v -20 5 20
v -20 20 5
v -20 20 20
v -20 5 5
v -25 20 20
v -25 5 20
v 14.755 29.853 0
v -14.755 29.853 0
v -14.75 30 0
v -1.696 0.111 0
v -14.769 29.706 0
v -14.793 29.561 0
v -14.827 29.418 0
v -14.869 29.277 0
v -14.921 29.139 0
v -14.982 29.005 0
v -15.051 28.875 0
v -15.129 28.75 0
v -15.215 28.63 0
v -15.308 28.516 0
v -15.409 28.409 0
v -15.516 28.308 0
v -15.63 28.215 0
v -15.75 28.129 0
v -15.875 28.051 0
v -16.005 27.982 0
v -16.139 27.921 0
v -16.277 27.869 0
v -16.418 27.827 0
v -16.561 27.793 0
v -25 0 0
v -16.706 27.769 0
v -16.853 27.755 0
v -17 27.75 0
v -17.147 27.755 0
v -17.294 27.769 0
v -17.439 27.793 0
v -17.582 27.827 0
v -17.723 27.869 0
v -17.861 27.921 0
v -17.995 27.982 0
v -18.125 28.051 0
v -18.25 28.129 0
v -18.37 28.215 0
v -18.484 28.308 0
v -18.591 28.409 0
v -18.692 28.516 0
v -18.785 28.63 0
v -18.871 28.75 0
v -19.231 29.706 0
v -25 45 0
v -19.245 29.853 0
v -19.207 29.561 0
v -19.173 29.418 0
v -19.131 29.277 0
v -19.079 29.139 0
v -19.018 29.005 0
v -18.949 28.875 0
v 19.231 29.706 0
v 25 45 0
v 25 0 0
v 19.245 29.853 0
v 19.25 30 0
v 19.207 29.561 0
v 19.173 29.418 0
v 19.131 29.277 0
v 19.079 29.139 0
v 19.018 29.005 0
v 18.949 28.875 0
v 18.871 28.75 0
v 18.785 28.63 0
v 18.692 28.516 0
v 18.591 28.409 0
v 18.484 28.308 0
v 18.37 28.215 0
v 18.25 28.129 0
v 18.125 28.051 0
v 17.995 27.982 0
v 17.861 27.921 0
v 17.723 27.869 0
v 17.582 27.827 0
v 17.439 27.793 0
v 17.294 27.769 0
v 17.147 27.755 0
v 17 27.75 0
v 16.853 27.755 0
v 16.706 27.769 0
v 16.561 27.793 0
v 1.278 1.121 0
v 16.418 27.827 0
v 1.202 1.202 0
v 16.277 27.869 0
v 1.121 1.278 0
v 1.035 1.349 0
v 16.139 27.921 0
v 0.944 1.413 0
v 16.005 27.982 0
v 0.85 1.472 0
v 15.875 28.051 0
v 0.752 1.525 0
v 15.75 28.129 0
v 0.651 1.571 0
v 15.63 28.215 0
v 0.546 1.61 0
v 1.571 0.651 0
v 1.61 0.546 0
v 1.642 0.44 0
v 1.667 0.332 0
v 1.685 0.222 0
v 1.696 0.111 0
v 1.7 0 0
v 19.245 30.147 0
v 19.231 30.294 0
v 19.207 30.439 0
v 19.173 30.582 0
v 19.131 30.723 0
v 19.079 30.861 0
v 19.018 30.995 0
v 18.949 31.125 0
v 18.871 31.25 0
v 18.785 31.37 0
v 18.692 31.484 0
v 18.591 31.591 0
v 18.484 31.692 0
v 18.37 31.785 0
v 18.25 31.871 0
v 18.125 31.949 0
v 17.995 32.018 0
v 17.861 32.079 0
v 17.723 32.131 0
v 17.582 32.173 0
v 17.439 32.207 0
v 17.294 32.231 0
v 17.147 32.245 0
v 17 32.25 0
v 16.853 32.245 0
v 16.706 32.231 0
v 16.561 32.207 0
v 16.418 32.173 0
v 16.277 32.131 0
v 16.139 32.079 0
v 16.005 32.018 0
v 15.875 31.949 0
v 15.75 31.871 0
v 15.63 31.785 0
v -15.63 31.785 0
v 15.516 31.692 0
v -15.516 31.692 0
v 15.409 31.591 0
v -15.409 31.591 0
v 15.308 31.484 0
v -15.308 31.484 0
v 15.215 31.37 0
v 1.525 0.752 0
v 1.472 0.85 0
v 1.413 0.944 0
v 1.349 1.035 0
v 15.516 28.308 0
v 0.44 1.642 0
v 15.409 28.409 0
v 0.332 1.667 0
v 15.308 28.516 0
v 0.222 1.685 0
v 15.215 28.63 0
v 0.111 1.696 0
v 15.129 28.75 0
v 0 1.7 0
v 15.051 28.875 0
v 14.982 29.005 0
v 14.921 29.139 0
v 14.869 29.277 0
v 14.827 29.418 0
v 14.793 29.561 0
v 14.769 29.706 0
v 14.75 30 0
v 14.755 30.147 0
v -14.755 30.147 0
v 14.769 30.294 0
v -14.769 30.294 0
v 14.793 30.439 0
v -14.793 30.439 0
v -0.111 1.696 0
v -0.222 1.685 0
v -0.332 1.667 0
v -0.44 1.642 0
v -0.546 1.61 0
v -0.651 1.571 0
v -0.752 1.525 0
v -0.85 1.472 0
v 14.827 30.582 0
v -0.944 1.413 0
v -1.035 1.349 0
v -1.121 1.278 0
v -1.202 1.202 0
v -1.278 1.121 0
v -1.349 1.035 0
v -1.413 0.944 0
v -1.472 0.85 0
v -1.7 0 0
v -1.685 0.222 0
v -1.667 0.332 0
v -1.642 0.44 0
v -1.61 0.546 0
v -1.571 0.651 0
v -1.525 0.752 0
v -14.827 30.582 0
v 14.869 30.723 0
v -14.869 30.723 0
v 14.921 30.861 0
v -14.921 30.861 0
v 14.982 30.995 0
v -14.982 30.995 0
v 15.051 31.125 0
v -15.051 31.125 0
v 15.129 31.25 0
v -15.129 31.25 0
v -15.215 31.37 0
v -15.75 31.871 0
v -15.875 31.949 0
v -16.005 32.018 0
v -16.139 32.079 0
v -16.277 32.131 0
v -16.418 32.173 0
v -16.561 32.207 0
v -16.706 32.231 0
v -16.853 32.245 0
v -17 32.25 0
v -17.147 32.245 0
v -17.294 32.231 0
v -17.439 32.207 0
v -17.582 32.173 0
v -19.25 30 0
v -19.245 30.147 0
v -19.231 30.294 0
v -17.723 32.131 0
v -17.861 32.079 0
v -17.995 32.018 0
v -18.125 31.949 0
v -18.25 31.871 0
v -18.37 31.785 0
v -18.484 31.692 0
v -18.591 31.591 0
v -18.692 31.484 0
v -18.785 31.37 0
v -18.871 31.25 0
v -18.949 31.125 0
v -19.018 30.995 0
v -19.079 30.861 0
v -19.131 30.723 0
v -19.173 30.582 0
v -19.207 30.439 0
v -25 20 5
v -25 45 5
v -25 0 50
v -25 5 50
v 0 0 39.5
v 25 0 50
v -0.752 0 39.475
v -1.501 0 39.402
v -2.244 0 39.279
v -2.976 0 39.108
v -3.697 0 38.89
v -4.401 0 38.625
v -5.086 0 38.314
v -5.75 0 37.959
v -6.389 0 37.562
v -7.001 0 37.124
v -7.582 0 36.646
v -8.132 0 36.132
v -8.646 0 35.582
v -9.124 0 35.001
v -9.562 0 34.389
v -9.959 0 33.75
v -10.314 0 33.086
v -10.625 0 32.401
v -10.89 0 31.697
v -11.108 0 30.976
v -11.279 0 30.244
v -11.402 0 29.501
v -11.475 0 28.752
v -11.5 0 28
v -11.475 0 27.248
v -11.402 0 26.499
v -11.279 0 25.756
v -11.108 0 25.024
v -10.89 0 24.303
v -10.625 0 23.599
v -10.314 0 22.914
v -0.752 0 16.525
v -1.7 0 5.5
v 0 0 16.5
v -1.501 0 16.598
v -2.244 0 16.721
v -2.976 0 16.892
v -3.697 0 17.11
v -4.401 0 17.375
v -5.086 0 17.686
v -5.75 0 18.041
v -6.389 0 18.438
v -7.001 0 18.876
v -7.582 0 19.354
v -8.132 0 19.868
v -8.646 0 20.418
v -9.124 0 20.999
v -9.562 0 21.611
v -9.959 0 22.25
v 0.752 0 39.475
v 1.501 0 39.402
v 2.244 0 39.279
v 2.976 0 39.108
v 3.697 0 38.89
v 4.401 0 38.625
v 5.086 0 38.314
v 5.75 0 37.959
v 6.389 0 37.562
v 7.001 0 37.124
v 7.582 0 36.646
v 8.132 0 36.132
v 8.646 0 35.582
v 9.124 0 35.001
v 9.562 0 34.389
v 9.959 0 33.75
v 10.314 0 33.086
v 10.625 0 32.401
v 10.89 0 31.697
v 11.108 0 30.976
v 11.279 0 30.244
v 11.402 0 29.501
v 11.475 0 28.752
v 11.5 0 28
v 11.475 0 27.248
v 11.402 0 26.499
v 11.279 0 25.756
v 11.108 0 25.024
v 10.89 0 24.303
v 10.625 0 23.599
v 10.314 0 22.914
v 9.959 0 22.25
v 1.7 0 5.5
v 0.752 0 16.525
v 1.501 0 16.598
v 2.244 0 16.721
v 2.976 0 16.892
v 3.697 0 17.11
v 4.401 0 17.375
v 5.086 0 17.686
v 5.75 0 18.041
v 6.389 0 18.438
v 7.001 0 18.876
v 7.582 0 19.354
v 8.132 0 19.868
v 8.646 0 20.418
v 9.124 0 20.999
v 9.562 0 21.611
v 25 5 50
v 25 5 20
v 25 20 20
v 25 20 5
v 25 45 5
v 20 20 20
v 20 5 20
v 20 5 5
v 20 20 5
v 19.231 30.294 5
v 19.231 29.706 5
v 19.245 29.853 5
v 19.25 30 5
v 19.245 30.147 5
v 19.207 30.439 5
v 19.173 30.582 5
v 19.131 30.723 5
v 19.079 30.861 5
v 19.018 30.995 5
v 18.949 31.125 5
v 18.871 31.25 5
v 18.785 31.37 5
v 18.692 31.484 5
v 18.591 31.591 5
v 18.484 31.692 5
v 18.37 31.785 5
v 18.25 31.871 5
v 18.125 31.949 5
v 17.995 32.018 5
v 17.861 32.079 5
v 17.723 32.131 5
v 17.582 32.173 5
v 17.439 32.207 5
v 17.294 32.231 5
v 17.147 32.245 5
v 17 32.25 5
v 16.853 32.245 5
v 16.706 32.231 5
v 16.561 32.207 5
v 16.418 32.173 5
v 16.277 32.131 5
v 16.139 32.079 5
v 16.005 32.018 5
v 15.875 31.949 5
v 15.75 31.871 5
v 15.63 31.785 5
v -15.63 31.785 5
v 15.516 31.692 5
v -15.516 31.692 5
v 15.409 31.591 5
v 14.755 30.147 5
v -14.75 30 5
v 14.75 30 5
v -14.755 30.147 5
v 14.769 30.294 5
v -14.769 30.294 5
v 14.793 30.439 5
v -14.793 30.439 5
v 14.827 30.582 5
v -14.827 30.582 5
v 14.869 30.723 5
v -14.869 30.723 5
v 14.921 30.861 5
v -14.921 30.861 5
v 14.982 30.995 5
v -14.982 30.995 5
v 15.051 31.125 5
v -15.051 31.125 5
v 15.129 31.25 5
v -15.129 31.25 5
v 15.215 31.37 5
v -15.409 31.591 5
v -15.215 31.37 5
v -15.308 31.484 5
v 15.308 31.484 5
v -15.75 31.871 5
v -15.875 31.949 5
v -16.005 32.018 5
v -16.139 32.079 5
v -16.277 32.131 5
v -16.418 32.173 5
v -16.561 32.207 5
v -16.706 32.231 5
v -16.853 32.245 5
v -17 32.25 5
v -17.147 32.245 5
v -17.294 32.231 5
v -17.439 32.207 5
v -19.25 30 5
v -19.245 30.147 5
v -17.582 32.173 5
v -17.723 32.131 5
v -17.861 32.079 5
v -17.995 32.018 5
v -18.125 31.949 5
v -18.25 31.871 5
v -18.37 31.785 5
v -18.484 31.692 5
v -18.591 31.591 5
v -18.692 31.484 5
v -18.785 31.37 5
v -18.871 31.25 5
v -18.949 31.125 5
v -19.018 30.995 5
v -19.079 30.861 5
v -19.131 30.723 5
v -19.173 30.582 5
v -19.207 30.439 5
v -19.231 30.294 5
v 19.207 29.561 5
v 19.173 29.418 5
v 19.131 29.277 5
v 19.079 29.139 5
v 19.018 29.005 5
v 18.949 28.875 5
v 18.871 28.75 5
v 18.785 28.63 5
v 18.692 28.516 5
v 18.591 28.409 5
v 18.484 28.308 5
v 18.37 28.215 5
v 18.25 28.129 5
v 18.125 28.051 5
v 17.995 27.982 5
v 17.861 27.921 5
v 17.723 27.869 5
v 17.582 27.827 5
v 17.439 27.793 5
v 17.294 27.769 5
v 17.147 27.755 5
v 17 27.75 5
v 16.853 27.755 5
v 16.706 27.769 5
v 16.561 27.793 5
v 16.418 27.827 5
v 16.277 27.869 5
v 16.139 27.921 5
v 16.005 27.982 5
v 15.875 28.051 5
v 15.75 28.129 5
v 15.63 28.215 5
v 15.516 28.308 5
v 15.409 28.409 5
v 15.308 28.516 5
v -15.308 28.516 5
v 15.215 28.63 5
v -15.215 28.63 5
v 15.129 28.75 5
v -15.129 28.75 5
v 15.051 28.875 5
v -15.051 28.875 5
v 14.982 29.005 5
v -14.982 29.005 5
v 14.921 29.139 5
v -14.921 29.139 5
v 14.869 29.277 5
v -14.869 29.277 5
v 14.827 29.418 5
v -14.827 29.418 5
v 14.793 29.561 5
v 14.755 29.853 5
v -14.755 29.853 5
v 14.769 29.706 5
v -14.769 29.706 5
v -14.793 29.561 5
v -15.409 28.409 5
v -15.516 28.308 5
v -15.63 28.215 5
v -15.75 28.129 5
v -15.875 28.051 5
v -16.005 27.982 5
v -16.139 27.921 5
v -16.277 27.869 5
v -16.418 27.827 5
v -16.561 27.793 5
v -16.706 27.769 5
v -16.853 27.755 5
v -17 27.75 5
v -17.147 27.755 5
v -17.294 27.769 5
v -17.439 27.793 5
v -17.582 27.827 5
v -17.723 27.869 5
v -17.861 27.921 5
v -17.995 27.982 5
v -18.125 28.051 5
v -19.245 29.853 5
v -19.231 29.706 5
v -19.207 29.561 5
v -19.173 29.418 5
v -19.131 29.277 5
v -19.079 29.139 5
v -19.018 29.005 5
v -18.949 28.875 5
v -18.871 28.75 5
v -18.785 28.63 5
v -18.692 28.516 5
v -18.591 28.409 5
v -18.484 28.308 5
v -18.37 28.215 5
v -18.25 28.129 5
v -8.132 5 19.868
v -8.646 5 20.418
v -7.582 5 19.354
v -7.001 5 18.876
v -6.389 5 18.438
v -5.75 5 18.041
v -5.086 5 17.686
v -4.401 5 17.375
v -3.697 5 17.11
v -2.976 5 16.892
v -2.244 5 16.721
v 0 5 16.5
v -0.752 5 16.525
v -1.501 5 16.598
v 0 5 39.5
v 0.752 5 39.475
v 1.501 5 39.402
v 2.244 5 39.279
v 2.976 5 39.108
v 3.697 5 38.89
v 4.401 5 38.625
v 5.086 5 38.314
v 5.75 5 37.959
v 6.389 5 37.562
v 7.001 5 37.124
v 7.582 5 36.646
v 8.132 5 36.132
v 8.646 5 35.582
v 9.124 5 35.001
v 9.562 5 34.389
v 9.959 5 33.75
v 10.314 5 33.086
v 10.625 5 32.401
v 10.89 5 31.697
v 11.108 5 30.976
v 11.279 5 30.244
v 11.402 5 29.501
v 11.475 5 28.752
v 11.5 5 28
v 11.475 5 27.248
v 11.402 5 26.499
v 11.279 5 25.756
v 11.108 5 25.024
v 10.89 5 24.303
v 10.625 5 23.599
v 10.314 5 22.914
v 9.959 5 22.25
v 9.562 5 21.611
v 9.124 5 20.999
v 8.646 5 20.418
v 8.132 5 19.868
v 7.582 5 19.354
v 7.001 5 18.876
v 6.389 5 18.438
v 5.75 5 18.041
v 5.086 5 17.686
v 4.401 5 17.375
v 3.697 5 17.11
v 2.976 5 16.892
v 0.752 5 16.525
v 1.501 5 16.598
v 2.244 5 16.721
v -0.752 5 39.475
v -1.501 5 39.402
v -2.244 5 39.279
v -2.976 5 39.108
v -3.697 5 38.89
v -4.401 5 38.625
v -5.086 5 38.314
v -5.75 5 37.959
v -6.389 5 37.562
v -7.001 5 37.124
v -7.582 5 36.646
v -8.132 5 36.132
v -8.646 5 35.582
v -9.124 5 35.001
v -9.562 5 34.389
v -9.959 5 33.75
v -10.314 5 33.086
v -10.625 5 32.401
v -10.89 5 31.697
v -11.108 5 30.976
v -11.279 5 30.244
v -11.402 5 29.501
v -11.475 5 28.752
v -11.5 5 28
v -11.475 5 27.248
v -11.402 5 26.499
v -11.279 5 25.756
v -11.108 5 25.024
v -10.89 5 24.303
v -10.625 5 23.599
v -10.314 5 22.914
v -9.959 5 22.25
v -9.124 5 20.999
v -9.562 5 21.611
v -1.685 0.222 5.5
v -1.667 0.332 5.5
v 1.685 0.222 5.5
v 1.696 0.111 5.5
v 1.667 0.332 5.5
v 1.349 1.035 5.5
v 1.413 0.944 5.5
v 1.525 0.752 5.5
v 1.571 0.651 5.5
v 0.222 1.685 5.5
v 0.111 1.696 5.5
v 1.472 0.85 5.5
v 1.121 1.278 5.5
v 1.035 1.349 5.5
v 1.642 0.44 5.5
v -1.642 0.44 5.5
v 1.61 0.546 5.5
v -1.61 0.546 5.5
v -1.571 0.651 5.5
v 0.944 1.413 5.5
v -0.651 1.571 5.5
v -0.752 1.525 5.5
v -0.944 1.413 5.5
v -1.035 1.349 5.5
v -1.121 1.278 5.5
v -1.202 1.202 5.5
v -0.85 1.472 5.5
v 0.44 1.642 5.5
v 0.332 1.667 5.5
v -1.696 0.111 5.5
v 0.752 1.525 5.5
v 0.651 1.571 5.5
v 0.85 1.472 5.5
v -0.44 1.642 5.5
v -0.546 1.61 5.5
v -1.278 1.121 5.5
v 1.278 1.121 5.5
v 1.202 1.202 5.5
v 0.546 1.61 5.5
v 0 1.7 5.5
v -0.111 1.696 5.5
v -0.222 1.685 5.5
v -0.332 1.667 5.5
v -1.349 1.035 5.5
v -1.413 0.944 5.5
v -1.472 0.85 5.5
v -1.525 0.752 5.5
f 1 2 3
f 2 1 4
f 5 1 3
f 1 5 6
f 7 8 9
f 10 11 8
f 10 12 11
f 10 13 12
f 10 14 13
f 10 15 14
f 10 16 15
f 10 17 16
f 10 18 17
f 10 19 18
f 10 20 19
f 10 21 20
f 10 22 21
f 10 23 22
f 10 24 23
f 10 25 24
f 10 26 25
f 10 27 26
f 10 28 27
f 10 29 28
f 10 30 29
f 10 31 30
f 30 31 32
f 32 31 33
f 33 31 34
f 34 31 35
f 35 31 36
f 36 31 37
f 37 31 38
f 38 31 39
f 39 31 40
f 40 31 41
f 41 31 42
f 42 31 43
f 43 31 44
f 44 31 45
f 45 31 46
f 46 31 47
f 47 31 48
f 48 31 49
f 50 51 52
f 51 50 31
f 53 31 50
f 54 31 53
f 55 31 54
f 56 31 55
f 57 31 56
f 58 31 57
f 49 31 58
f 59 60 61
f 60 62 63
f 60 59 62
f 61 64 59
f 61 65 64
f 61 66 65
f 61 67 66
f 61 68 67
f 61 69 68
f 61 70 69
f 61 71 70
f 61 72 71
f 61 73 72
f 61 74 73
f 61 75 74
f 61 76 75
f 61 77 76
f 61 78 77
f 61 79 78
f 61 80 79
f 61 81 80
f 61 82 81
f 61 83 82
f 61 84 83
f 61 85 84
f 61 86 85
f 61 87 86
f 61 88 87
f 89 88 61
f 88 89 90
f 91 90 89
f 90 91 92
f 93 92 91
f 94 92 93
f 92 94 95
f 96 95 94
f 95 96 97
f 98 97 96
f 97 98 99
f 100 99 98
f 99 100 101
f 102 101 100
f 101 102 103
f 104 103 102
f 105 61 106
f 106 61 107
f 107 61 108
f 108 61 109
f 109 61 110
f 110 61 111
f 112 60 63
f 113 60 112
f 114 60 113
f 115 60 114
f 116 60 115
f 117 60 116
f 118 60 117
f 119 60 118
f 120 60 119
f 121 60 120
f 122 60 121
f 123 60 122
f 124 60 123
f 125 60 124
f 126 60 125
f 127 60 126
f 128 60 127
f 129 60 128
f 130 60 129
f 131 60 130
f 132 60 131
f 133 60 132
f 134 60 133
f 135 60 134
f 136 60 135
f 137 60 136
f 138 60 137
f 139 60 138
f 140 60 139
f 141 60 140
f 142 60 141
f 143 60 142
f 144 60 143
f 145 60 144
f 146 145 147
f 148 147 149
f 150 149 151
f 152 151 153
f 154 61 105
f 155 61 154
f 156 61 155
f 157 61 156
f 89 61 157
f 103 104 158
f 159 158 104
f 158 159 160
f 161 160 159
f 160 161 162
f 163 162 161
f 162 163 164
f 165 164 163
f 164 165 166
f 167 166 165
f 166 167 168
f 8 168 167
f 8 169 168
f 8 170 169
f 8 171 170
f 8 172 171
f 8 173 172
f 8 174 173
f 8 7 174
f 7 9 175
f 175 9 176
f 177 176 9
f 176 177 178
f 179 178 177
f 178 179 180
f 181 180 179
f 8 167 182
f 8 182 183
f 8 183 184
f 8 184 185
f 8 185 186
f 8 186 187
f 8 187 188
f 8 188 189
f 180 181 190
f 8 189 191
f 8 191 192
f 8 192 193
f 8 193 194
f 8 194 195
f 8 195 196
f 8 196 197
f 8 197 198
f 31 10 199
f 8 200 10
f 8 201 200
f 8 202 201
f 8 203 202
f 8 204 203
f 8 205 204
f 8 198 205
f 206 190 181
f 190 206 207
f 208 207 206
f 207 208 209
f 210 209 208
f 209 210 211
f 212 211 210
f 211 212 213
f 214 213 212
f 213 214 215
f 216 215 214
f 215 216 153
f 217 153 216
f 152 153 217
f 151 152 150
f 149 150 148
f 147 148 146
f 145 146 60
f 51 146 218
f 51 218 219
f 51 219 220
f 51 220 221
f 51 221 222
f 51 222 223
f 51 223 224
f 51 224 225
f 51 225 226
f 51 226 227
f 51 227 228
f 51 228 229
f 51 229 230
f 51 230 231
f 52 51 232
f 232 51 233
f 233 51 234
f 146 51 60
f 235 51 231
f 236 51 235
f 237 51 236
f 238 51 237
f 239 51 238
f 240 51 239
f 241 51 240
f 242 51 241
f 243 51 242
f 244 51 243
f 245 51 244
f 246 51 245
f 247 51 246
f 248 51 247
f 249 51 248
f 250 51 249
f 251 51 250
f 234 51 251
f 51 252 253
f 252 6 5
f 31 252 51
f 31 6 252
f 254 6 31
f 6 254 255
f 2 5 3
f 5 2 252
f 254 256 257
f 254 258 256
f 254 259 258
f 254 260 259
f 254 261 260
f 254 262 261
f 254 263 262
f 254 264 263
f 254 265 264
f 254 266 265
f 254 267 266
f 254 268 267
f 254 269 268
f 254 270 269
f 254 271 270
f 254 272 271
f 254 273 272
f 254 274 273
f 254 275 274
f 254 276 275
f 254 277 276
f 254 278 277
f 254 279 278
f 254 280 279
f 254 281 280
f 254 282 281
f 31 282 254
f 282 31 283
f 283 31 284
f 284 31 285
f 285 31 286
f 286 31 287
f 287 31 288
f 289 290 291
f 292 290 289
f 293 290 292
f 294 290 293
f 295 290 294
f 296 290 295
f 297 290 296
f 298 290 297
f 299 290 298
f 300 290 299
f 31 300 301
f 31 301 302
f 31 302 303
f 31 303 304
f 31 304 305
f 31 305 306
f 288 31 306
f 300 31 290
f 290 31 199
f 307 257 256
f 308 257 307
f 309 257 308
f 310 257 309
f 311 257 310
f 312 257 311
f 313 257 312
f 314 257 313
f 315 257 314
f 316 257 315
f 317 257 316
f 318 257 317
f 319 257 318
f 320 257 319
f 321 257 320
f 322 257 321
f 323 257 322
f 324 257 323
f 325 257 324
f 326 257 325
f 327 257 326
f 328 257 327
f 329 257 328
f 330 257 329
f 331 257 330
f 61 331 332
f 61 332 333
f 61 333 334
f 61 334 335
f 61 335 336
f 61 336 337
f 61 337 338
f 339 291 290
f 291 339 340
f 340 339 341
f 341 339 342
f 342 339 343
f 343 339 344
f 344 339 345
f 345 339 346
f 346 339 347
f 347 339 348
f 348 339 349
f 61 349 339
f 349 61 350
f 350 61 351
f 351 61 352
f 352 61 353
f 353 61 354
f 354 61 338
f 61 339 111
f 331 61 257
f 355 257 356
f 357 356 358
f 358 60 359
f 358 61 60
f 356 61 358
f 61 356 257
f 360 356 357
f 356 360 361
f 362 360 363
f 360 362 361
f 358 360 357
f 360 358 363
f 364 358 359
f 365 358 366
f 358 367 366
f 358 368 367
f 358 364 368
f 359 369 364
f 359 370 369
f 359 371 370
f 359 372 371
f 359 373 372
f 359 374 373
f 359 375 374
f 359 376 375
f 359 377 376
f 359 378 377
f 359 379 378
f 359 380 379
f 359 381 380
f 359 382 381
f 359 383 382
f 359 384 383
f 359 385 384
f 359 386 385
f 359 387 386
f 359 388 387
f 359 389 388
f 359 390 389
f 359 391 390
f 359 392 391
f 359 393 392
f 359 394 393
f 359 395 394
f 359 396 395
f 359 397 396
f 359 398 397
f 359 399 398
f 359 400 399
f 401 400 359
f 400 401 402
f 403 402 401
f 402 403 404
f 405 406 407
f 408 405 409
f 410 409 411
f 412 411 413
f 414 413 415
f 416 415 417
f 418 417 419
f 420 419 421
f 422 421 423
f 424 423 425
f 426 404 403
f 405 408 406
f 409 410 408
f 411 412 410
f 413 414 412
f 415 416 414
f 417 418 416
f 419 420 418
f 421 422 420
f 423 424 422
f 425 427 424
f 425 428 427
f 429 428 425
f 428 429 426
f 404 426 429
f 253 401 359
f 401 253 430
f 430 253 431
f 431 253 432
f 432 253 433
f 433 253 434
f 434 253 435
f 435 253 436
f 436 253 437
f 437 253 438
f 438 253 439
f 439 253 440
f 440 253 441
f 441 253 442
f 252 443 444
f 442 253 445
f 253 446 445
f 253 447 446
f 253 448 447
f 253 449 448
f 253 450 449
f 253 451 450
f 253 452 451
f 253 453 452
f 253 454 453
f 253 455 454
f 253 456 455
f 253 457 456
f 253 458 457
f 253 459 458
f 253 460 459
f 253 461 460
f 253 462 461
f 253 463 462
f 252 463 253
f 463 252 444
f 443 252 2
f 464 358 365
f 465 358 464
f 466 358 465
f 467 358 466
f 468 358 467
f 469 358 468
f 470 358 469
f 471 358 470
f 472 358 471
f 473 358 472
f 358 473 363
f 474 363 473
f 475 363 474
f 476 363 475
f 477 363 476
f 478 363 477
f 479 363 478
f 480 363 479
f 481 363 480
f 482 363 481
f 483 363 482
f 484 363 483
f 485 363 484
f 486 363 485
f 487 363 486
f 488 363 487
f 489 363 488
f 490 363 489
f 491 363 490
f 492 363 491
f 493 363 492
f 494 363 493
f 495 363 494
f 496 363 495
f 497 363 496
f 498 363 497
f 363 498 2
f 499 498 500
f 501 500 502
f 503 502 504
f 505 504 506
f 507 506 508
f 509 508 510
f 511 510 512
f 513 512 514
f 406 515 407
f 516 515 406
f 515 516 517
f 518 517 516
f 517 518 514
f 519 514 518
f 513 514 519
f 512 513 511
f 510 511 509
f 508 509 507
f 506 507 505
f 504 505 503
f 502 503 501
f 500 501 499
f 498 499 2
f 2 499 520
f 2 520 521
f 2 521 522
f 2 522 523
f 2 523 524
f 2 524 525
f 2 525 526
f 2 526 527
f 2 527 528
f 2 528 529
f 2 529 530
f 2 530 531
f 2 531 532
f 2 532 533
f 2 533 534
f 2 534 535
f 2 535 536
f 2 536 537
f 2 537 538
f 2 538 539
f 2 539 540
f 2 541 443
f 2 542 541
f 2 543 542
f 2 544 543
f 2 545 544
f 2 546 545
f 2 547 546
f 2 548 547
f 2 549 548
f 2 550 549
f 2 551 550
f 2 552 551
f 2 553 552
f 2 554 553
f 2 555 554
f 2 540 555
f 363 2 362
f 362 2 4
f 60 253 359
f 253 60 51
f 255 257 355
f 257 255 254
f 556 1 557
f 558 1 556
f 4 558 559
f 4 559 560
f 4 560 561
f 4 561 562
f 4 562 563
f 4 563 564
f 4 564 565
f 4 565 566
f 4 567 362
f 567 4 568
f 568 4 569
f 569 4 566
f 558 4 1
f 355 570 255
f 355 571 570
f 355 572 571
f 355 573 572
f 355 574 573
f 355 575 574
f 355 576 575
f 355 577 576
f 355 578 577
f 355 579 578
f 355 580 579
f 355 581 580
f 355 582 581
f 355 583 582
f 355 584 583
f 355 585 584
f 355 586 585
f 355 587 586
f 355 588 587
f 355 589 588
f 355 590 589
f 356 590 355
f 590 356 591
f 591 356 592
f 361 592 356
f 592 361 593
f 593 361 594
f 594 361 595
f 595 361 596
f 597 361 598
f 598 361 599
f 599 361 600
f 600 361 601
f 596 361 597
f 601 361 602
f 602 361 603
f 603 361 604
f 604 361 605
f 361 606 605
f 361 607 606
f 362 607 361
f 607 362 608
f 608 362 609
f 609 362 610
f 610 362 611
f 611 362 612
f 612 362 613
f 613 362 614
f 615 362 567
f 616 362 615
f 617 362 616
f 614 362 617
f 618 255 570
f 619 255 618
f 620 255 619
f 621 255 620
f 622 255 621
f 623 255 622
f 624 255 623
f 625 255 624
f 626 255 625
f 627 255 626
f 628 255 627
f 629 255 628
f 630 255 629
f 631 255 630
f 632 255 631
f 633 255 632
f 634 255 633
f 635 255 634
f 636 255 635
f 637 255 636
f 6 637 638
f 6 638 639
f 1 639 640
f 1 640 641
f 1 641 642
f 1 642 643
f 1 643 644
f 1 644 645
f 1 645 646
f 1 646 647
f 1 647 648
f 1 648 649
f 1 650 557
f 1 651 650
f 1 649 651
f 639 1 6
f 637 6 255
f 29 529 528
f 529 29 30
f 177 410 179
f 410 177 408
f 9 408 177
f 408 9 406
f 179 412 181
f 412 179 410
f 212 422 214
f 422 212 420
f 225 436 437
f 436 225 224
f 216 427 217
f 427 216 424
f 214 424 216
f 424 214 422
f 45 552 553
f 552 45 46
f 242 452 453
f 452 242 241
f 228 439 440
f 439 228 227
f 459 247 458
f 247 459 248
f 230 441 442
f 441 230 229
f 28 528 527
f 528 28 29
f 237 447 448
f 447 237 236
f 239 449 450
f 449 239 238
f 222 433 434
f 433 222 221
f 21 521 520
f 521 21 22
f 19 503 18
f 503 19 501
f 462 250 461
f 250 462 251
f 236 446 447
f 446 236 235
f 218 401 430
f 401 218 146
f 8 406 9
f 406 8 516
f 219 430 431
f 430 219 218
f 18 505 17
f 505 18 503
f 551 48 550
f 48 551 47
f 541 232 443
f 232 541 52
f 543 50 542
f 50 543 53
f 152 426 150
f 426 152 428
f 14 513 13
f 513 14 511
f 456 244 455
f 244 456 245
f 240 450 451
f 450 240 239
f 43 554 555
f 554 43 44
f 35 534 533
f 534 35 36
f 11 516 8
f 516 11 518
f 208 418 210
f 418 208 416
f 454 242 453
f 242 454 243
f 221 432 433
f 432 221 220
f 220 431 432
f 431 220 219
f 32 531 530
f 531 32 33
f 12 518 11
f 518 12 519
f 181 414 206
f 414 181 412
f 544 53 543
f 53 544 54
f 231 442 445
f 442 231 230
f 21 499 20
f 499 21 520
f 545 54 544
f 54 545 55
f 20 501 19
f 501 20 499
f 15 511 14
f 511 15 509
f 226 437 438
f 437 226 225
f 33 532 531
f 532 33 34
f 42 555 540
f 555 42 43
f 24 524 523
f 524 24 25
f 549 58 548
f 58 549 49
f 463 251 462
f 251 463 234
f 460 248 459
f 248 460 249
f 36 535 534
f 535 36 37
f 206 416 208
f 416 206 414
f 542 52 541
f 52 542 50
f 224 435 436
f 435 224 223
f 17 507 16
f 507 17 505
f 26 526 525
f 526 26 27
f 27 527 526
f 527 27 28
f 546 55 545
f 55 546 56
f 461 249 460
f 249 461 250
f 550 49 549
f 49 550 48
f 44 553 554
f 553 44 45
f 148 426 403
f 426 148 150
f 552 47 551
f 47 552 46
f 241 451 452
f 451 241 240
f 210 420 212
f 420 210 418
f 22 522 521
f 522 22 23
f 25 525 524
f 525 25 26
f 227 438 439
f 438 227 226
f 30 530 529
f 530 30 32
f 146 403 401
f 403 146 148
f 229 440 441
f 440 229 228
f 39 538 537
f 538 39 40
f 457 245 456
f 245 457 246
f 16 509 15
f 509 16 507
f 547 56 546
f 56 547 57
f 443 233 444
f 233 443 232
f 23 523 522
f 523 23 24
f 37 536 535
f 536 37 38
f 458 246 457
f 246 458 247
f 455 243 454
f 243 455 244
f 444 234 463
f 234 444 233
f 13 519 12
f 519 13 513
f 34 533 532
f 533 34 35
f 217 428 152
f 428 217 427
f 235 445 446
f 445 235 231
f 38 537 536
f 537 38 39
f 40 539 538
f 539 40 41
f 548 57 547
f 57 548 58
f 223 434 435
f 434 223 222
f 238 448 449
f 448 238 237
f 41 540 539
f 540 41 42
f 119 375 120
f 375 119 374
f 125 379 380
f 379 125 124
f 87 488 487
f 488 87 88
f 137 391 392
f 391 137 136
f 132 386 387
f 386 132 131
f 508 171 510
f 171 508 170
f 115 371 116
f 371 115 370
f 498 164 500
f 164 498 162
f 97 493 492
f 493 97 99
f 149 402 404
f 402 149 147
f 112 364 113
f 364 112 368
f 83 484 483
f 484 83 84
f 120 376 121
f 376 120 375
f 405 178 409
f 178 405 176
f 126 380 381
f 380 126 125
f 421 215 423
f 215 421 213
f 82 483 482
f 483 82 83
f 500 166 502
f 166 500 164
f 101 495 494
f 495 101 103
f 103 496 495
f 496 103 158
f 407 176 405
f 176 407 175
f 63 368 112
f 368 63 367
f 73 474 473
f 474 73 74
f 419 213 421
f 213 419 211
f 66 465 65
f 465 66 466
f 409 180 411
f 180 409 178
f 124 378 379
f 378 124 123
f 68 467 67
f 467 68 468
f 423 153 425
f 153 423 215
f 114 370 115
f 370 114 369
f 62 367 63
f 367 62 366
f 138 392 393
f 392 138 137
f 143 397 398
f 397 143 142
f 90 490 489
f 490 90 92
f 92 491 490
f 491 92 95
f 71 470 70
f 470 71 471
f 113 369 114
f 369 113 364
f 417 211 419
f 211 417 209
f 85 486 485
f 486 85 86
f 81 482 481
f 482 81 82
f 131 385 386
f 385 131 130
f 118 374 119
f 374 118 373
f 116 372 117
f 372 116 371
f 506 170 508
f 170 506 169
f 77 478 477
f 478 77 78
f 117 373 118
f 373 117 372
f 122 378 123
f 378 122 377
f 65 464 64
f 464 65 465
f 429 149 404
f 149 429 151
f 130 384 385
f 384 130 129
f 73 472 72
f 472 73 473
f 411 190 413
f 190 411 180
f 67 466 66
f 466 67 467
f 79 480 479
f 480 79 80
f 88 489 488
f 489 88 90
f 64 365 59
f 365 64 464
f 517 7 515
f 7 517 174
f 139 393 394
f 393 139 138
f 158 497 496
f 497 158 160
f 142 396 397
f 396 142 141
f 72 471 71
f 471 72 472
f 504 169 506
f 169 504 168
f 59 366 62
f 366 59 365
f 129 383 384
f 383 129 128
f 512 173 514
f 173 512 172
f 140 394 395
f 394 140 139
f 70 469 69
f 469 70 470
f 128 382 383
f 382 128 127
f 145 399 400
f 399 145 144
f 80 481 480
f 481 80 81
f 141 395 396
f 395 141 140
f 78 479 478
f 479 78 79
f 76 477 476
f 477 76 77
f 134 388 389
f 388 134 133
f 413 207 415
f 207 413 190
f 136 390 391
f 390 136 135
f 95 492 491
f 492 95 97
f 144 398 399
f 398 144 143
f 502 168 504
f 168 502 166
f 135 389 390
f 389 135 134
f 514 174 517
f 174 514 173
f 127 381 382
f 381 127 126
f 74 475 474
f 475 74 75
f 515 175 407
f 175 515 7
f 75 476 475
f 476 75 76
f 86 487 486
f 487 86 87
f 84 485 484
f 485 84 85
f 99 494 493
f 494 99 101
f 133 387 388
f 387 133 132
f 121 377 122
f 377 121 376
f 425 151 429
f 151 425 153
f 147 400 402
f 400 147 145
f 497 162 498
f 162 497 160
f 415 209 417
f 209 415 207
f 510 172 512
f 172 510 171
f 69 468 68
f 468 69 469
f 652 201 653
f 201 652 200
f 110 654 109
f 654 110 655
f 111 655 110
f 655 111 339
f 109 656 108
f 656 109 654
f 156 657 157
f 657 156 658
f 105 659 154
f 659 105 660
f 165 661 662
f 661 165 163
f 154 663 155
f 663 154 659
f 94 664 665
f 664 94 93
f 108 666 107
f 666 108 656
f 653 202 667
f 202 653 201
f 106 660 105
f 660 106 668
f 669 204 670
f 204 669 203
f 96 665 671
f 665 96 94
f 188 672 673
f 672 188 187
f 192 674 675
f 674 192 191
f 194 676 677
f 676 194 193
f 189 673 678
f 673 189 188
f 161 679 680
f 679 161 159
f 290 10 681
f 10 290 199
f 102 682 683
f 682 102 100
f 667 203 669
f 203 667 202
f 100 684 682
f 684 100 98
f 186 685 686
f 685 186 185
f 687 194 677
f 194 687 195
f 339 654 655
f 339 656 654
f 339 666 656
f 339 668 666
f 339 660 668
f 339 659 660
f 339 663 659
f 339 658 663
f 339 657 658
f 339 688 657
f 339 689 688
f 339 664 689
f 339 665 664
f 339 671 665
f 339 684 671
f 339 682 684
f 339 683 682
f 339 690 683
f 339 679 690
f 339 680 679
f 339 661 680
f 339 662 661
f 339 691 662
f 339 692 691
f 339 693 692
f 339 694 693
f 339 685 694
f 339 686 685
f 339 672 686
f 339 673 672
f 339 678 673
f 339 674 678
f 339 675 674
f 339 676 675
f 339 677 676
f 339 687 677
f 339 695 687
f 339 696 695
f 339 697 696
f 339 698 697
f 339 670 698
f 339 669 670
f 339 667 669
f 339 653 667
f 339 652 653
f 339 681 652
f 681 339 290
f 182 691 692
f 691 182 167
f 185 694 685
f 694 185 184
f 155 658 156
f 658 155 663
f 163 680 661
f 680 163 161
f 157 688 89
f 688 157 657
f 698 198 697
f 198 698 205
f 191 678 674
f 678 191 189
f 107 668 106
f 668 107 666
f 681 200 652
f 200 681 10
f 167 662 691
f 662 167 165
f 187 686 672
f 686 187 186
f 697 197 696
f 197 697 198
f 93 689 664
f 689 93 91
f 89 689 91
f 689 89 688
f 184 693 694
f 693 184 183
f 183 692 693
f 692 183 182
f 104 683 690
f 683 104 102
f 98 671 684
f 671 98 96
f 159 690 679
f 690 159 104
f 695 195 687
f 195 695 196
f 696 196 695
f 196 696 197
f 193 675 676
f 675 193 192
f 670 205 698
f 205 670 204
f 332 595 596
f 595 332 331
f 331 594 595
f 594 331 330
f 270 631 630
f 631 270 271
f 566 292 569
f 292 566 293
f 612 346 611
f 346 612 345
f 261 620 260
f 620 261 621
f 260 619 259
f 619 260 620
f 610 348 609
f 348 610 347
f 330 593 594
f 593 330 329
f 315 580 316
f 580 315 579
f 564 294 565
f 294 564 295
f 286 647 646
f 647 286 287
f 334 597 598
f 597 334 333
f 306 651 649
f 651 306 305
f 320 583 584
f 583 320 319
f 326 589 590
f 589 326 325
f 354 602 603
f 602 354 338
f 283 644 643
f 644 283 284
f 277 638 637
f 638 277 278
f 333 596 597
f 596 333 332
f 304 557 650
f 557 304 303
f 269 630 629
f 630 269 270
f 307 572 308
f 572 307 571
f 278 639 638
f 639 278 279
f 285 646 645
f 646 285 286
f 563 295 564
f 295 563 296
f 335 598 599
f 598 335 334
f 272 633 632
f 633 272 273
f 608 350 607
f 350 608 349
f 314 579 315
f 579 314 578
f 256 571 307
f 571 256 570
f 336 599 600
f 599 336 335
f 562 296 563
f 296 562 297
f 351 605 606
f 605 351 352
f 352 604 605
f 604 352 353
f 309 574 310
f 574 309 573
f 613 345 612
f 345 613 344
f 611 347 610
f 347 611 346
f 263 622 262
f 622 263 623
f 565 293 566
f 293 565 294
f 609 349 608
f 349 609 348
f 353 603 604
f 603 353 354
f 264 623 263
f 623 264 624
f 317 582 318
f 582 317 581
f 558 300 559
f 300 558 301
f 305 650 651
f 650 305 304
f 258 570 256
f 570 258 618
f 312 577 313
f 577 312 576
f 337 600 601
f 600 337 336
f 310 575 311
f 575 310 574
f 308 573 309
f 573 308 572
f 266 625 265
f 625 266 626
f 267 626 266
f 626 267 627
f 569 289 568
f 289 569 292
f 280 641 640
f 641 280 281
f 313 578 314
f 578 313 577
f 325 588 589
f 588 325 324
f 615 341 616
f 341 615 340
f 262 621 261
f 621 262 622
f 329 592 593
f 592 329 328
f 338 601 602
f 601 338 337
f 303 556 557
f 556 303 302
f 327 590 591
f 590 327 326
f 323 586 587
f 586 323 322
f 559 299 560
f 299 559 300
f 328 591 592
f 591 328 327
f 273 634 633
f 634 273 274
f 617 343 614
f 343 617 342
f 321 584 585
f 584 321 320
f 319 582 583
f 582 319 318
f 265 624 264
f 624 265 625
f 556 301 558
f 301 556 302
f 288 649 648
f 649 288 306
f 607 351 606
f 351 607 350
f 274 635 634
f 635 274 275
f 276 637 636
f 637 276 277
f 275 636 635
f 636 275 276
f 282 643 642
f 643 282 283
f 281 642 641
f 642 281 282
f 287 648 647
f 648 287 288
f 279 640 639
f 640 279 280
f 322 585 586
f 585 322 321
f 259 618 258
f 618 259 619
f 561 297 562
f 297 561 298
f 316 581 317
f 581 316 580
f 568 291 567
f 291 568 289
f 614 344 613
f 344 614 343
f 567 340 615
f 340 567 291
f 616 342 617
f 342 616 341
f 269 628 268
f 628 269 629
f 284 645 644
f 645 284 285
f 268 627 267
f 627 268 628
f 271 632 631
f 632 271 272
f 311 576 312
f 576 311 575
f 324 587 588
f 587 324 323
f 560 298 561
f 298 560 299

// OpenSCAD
// L-shaped mounting bracket for NEMA 17 stepper motor (syringe pump)
// Print orientation: base plate on bed, motor plate builds upward (+Z)

// ---------------- Parameters ----------------
plate_w      = 50;    // base plate length (X)
plate_h      = 45;    // base plate width (Y)
plate_t      = 5;     // base plate thickness (Z)

hole_x       = 17;    // M4 through-hole offset from origin (±X)
hole_y       = 30;    // M4 through-hole position (Y)
hole_d       = 4.5;   // M4 through-hole diameter

motor_w      = 50;    // motor plate length (X)
motor_h      = 5;     // motor plate width (Y)
motor_z      = 50;    // motor plate height (Z)

boss_d       = 23;    // motor centring boss hole diameter
boss_x       = 0;     // boss hole centre X
boss_z       = 28;    // boss hole centre Z

screw_d      = 3.4;   // M3 screw hole diameter
screw_pitch  = 31;    // square pattern side length

gusset_t     = 5;     // gusset thickness (X)
gusset_leg   = 20;    // right-triangle leg length (Y and Z)

eps          = 0.5;   // cutter overshoot past faces
$fn          = 96;    // curve resolution

// ---------------- Model ----------------
difference() {
    union() {
        // Base plate
        translate([-plate_w/2, 0, 0])
            cube([plate_w, plate_h, plate_t]);

        // Motor plate (overlaps base plate for a solid union)
        translate([-motor_w/2, 0, 0])
            cube([motor_w, motor_h, motor_z]);

        // Gussets: right-triangle in YZ, flush with outer X edges
        for (sx = [-1, 1])
            translate([sx > 0 ? motor_w/2 - gusset_t : -motor_w/2, 0, 0])
                cube([gusset_t, gusset_leg, gusset_leg]);
    }

    // M4 through-holes in base plate
    for (x = [-hole_x, hole_x])
        translate([x, hole_y, -eps])
            cylinder(d = hole_d, h = plate_t + 2*eps);

    // Motor boss hole through motor plate (along Y)
    translate([boss_x, -eps, boss_z])
        rotate([-90, 0, 0])
            cylinder(d = boss_d, h = motor_h + 2*eps);

    // M3 screw holes on square pattern, centred on boss hole
    for (a = [0, 90, 180, 270])
        rotate([0, 0, a])
            translate([0, 0, -eps])
                cylinder(d = screw_d, h = motor_h + 2*eps);
}
